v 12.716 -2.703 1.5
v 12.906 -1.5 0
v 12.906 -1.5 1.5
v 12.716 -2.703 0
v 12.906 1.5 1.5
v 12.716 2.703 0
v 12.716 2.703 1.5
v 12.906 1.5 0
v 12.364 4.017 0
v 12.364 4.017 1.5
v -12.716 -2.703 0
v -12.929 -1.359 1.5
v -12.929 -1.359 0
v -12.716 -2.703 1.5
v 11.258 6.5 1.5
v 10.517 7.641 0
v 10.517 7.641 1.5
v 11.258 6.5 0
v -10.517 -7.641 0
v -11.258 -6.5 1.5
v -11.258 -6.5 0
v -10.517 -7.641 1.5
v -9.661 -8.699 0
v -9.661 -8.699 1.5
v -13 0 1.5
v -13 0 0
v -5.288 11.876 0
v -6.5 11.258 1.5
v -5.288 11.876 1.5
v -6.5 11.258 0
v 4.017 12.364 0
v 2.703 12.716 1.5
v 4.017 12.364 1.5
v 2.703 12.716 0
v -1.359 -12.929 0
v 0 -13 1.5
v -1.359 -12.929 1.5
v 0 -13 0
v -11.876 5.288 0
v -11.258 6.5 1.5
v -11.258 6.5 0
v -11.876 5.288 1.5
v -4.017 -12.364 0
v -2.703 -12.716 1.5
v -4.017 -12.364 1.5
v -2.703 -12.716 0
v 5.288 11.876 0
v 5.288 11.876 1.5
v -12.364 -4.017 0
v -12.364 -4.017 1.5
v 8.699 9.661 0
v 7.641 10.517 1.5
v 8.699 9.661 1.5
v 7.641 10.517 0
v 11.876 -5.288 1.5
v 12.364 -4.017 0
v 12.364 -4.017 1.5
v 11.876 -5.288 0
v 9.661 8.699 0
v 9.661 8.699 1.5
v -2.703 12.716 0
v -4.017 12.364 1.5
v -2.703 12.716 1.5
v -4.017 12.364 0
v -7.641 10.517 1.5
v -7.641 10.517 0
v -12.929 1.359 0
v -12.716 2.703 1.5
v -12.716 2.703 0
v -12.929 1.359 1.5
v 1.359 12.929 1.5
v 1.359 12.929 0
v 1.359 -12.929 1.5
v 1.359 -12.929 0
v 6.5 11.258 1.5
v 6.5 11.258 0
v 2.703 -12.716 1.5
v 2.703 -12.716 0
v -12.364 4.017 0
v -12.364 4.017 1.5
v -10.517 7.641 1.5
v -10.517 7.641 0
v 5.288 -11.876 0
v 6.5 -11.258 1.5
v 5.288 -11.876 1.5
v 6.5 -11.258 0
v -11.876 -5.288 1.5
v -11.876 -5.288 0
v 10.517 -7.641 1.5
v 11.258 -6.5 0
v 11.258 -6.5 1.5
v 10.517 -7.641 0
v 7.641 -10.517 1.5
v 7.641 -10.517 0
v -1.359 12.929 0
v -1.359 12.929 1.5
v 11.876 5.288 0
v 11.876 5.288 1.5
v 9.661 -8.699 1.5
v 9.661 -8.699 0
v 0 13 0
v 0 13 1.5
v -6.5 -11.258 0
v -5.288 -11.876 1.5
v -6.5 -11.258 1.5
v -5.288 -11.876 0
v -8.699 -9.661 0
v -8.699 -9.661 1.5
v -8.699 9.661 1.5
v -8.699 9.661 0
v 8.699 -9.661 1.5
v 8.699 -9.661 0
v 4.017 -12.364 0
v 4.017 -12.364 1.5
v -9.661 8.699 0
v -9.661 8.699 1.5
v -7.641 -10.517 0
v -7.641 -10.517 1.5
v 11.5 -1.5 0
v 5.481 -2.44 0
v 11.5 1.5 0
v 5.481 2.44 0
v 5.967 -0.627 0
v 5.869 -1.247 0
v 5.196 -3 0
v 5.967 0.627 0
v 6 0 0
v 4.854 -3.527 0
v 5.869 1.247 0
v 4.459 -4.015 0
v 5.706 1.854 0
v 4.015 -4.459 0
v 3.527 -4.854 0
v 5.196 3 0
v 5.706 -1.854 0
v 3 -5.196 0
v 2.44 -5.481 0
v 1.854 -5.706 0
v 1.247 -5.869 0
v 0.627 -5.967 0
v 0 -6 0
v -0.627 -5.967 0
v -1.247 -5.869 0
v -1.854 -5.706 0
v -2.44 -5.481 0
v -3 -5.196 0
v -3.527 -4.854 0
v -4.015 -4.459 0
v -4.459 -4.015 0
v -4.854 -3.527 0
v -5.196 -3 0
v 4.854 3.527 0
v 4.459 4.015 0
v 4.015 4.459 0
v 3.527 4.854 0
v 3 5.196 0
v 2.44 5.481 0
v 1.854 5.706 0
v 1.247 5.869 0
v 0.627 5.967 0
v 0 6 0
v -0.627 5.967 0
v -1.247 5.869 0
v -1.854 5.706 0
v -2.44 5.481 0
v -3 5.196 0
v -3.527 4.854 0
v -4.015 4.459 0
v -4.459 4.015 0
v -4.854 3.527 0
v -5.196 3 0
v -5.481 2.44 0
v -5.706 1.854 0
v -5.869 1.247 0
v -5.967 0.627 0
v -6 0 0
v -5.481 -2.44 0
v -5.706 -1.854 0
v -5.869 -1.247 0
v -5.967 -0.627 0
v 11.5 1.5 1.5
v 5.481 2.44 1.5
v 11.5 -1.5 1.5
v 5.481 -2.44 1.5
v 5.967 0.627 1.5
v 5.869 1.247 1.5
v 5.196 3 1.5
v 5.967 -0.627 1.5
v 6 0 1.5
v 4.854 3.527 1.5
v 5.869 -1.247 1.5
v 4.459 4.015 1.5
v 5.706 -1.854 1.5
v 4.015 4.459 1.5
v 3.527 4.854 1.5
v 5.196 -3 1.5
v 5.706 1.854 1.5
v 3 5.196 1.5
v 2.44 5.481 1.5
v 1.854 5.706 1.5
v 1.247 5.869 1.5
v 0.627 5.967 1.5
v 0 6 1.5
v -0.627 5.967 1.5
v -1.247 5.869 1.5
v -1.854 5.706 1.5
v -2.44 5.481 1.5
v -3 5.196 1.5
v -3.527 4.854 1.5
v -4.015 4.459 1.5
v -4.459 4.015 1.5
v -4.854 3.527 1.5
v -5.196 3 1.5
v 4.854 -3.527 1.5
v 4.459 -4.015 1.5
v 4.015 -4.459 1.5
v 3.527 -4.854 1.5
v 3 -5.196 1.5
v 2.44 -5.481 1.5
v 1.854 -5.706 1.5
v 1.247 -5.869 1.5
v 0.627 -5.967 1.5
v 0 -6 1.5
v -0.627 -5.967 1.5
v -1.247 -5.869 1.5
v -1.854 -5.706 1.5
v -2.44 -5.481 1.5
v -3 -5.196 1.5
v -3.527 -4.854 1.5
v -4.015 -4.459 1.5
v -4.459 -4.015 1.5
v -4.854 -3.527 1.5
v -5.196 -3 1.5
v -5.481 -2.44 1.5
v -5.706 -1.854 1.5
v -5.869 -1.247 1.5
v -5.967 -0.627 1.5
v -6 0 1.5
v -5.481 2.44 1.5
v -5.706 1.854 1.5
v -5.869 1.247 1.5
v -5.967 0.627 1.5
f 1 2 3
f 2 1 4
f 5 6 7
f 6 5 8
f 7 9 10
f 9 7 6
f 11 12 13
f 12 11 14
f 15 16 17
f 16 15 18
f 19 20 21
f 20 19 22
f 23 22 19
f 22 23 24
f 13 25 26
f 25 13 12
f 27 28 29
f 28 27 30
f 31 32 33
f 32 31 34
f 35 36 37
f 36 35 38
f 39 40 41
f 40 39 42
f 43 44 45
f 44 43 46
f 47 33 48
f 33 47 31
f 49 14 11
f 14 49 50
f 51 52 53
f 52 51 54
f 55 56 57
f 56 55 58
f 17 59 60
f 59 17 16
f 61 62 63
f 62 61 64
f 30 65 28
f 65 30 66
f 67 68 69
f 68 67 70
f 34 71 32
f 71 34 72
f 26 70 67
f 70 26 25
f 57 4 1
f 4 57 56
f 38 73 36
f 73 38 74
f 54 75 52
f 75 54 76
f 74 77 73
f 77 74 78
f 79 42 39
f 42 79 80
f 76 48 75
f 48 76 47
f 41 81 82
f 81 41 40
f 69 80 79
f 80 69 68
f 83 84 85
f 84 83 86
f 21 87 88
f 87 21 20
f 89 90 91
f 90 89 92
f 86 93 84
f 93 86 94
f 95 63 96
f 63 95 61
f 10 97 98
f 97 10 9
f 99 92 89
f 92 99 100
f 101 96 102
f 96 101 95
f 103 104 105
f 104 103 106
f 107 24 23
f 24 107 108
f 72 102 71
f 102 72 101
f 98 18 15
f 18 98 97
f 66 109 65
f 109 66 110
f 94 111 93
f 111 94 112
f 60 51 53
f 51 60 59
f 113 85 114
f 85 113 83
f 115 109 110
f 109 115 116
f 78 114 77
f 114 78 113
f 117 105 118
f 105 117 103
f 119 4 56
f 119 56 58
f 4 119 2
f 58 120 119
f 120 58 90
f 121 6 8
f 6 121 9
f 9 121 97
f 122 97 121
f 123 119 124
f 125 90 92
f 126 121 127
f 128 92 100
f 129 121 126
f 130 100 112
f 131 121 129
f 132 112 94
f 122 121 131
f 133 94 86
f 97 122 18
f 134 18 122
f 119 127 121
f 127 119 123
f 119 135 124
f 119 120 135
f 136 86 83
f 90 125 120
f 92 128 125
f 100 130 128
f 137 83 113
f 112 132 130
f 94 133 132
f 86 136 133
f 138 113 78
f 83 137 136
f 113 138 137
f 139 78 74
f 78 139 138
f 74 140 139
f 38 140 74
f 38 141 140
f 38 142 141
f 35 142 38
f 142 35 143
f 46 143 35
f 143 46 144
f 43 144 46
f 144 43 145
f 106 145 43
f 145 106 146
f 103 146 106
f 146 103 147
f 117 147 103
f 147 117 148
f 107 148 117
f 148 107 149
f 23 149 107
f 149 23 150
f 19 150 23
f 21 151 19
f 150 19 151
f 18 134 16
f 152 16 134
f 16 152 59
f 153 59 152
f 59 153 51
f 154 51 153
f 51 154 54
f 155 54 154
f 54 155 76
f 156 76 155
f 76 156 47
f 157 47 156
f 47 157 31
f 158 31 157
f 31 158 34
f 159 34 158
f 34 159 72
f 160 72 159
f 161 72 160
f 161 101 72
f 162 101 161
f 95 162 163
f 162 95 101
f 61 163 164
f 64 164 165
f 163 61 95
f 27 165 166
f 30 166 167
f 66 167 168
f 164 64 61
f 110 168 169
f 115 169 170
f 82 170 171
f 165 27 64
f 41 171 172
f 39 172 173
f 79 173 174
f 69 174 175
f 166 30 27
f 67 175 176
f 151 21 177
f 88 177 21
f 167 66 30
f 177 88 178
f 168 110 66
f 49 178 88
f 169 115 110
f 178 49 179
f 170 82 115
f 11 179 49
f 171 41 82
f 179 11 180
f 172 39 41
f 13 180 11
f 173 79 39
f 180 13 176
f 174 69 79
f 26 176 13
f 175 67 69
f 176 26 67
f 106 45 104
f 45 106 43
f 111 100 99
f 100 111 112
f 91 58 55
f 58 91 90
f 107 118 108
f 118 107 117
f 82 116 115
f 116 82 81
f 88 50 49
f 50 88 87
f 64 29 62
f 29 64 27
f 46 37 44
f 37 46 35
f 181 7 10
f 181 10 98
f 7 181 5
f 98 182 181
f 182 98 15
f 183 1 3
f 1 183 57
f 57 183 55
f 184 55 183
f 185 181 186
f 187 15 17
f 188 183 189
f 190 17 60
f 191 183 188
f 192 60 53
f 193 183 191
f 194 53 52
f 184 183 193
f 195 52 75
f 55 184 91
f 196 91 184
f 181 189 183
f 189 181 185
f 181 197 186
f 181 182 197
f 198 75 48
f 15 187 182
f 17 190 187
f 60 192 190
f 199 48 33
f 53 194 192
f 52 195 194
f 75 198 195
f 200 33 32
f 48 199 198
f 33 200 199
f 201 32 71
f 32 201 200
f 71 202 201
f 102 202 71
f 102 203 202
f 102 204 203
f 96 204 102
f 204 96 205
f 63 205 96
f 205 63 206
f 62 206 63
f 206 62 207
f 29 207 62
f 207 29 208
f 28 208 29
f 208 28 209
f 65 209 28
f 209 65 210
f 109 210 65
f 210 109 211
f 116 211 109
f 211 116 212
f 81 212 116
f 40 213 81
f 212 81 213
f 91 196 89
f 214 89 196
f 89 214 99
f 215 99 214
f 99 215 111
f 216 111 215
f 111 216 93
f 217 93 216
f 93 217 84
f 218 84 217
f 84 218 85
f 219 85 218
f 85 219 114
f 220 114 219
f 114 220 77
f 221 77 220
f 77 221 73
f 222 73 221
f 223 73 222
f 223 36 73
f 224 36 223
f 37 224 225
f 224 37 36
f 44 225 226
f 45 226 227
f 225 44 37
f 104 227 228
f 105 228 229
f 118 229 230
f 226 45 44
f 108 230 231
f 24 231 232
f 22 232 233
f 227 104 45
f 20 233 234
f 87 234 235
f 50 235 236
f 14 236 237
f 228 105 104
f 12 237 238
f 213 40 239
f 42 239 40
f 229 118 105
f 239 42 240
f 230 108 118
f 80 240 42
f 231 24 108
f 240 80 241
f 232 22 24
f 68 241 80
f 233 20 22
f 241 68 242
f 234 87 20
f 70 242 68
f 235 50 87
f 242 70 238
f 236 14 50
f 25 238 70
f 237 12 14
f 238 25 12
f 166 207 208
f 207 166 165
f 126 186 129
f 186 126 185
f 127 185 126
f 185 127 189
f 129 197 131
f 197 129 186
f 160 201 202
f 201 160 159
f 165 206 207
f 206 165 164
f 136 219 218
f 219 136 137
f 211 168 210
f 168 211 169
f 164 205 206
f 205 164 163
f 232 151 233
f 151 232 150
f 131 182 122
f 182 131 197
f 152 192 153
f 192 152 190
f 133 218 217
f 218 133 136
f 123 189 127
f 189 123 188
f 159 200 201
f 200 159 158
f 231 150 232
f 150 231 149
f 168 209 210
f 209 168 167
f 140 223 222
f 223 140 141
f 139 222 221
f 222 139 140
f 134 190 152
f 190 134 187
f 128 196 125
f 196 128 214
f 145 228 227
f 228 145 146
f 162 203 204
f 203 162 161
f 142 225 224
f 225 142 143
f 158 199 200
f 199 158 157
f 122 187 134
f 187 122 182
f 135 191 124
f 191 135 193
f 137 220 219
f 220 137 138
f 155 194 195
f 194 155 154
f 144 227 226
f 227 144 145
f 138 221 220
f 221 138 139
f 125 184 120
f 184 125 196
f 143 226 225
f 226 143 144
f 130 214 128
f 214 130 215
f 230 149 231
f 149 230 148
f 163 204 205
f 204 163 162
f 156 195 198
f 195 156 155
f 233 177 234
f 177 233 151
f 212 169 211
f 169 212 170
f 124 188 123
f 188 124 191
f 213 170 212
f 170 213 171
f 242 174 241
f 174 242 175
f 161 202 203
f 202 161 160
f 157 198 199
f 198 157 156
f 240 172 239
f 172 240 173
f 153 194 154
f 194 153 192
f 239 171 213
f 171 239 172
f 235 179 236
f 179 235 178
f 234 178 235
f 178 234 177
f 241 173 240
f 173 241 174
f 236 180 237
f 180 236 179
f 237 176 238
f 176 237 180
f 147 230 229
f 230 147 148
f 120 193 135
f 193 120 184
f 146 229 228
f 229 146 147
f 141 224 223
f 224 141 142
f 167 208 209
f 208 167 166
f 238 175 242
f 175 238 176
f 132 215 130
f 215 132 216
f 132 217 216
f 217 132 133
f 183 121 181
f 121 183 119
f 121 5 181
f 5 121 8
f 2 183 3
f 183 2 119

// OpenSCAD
// External retaining ring with installation gap.
$fn = 60;
eps = 0.02;
shaft_d = 12;
outer_d = 26;
thickness = 1.5;
gap = 3;
difference() {
    cylinder(d = outer_d, h = thickness);
    translate([0, 0, -eps]) cylinder(d = shaft_d, h = thickness + 2 * eps);
    translate([outer_d / 2 - gap / 2, -gap / 2, -eps]) cube([gap + eps, gap, thickness + 2 * eps]);
}
